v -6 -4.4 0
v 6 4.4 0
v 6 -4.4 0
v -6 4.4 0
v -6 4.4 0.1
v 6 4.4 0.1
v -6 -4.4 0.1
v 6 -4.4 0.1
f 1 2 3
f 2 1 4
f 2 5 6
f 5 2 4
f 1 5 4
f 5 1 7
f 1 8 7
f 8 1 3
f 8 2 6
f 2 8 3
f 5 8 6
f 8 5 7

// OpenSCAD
// file: ../p/4-4edge.scad
use <../lib.scad>
$fa=1; $fs=0.2;
function ldraw_lib__4_4edge(realsolid=false) = [
// 0 Circle 1.0
// 0 Name: 4-4edge.dat
// 0 Author: James Jessiman
// 0 !LDRAW_ORG Primitive UPDATE 2017-01
// 0 !LICENSE Licensed under CC BY 2.0 and CC BY 4.0 : see CAreadme.txt
// 
// 0 BFC CERTIFY CCW
  [0,"BFC","CERTIFY"],
  [0,"BFC","CCW"],
// 
// 0 !HISTORY 1998-12-15 [PTadmin] Official Update 1998-10
// 0 !HISTORY 2005-12-28 [PTadmin] Official Update 2005-01
// 0 !HISTORY 2007-06-24 [PTadmin] Header formatted for Contributor Agreement
// 0 !HISTORY 2008-07-01 [PTadmin] Official Update 2008-01
// 0 !HISTORY 2017-01-15 [Steffen] BFCed
// 0 !HISTORY 2017-12-30 [PTadmin] Official Update 2017-01
// 
// 
// 2 24 1 0 0 0.9239 0 0.3827
  [2,24,1,0,0,0.9239,0,0.3827],
// 2 24 0.9239 0 0.3827 0.7071 0 0.7071
  [2,24,0.9239,0,0.3827,0.7071,0,0.7071],
// 2 24 0.7071 0 0.7071 0.3827 0 0.9239
  [2,24,0.7071,0,0.7071,0.3827,0,0.9239],
// 2 24 0.3827 0 0.9239 0 0 1
  [2,24,0.3827,0,0.9239,0,0,1],
// 2 24 0 0 1 -0.3827 0 0.9239
  [2,24,0,0,1,-0.3827,0,0.9239],
// 2 24 -0.3827 0 0.9239 -0.7071 0 0.7071
  [2,24,-0.3827,0,0.9239,-0.7071,0,0.7071],
// 2 24 -0.7071 0 0.7071 -0.9239 0 0.3827
  [2,24,-0.7071,0,0.7071,-0.9239,0,0.3827],
// 2 24 -0.9239 0 0.3827 -1 0 -0
  [2,24,-0.9239,0,0.3827,-1,0,-0],
// 2 24 -1 0 -0 -0.9239 0 -0.3827
  [2,24,-1,0,-0,-0.9239,0,-0.3827],
// 2 24 -0.9239 0 -0.3827 -0.7071 0 -0.7071
  [2,24,-0.9239,0,-0.3827,-0.7071,0,-0.7071],
// 2 24 -0.7071 0 -0.7071 -0.3827 0 -0.9239
  [2,24,-0.7071,0,-0.7071,-0.3827,0,-0.9239],
// 2 24 -0.3827 0 -0.9239 0 0 -1
  [2,24,-0.3827,0,-0.9239,0,0,-1],
// 2 24 0 0 -1 0.3827 0 -0.9239
  [2,24,0,0,-1,0.3827,0,-0.9239],
// 2 24 0.3827 0 -0.9239 0.7071 0 -0.7071
  [2,24,0.3827,0,-0.9239,0.7071,0,-0.7071],
// 2 24 0.7071 0 -0.7071 0.9239 0 -0.3827
  [2,24,0.7071,0,-0.7071,0.9239,0,-0.3827],
// 2 24 0.9239 0 -0.3827 1 0 0
  [2,24,0.9239,0,-0.3827,1,0,0],
];
module ldraw_lib__4_4edge(step=0, col=false, unit=2/5, alt=false, line=0.2, solid=!$preview)
    makepoly(ldraw_lib__4_4edge(solid), step=step, col=col, unit=unit, alt=alt, line=line, solid=solid);
ldraw_lib__4_4edge(line=0.2);
// file: ../p/4-4disc.scad
use <../lib.scad>
$fa=1; $fs=0.2;
function ldraw_lib__4_4disc(realsolid=false) = [
// 0 Disc 1.0
// 0 Name: 4-4disc.dat
// 0 Author: James Jessiman
// 0 !LDRAW_ORG Primitive UPDATE 2002-02
// 0 !LICENSE Licensed under CC BY 2.0 and CC BY 4.0 : see CAreadme.txt
// 
// 0 BFC CERTIFY CCW
  [0,"BFC","CERTIFY"],
  [0,"BFC","CCW"],
// 
// 0 !HISTORY 1998-12-15 [PTadmin] Official Update 1998-10
// 0 !HISTORY 2002-03-23 [sbliss] Added BFC statement
// 0 !HISTORY 2002-04-25 [PTadmin] Official Update 2002-02
// 0 !HISTORY 2007-06-24 [PTadmin] Header formatted for Contributor Agreement
// 0 !HISTORY 2008-07-01 [PTadmin] Official Update 2008-01
// 
// 
// 3 16 0 0 0 1 0 0 0.9239 0 0.3827
  [3,16,0,0,0,1,0,0,0.9239,0,0.3827],
// 3 16 0 0 0 0.9239 0 0.3827 0.7071 0 0.7071
  [3,16,0,0,0,0.9239,0,0.3827,0.7071,0,0.7071],
// 3 16 0 0 0 0.7071 0 0.7071 0.3827 0 0.9239
  [3,16,0,0,0,0.7071,0,0.7071,0.3827,0,0.9239],
// 3 16 0 0 0 0.3827 0 0.9239 0 0 1
  [3,16,0,0,0,0.3827,0,0.9239,0,0,1],
// 3 16 0 0 0 0 0 1 -0.3827 0 0.9239
  [3,16,0,0,0,0,0,1,-0.3827,0,0.9239],
// 3 16 0 0 0 -0.3827 0 0.9239 -0.7071 0 0.7071
  [3,16,0,0,0,-0.3827,0,0.9239,-0.7071,0,0.7071],
// 3 16 0 0 0 -0.7071 0 0.7071 -0.9239 0 0.3827
  [3,16,0,0,0,-0.7071,0,0.7071,-0.9239,0,0.3827],
// 3 16 0 0 0 -0.9239 0 0.3827 -1 0 -0
  [3,16,0,0,0,-0.9239,0,0.3827,-1,0,-0],
// 3 16 0 0 0 -1 0 -0 -0.9239 0 -0.3827
  [3,16,0,0,0,-1,0,-0,-0.9239,0,-0.3827],
// 3 16 0 0 0 -0.9239 0 -0.3827 -0.7071 0 -0.7071
  [3,16,0,0,0,-0.9239,0,-0.3827,-0.7071,0,-0.7071],
// 3 16 0 0 0 -0.7071 0 -0.7071 -0.3827 0 -0.9239
  [3,16,0,0,0,-0.7071,0,-0.7071,-0.3827,0,-0.9239],
// 3 16 0 0 0 -0.3827 0 -0.9239 0 0 -1
  [3,16,0,0,0,-0.3827,0,-0.9239,0,0,-1],
// 3 16 0 0 0 0 0 -1 0.3827 0 -0.9239
  [3,16,0,0,0,0,0,-1,0.3827,0,-0.9239],
// 3 16 0 0 0 0.3827 0 -0.9239 0.7071 0 -0.7071
  [3,16,0,0,0,0.3827,0,-0.9239,0.7071,0,-0.7071],
// 3 16 0 0 0 0.7071 0 -0.7071 0.9239 0 -0.3827
  [3,16,0,0,0,0.7071,0,-0.7071,0.9239,0,-0.3827],
// 3 16 0 0 0 0.9239 0 -0.3827 1 0 0
  [3,16,0,0,0,0.9239,0,-0.3827,1,0,0],
// 0
];
module ldraw_lib__4_4disc(step=0, col=false, unit=2/5, alt=false, line=0.2, solid=!$preview)
    makepoly(ldraw_lib__4_4disc(solid), step=step, col=col, unit=unit, alt=alt, line=line, solid=solid);
ldraw_lib__4_4disc(line=0.2);
// file: ../p/4-4cyli.scad
use <../lib.scad>
$fa=1; $fs=0.2;
function ldraw_lib__4_4cyli(realsolid=false) = [
// 0 Cylinder 1.0
// 0 Name: 4-4cyli.dat
// 0 Author: James Jessiman
// 0 !LDRAW_ORG Primitive UPDATE 2005-01
// 0 !LICENSE Licensed under CC BY 2.0 and CC BY 4.0 : see CAreadme.txt
// 
// 0 BFC CERTIFY CCW
  [0,"BFC","CERTIFY"],
  [0,"BFC","CCW"],
// 
// 0 !HISTORY 1998-12-15 [PTadmin] Official Update 1998-10
// 0 !HISTORY 2002-03-23 [sbliss] Added BFC statement; merged headers from files in distributions LDraw 0.27 and Complete.
// 0 !HISTORY 2002-04-25 [PTadmin] Official Update 2002-02
// 0 !HISTORY 2004-12-14 [guyvivan] BFC CCW
// 0 !HISTORY 2005-12-28 [PTadmin] Official Update 2005-01
// 0 !HISTORY 2007-06-24 [PTadmin] Header formatted for Contributor Agreement
// 0 !HISTORY 2008-07-01 [PTadmin] Official Update 2008-01
// 
// 
// 4 16 1 1 0 0.9239 1 0.3827 0.9239 0 0.3827 1 0 0
  [4,16,1,1,0,0.9239,1,0.3827,0.9239,0,0.3827,1,0,0],
// 5 24 1 0 0 1 1 0 0.9239 0 0.3827 0.9239 0 -0.3827
  [5,24,1,0,0,1,1,0,0.9239,0,0.3827,0.9239,0,-0.3827],
// 4 16 0.9239 1 0.3827 0.7071 1 0.7071 0.7071 0 0.7071 0.9239 0 0.3827
  [4,16,0.9239,1,0.3827,0.7071,1,0.7071,0.7071,0,0.7071,0.9239,0,0.3827],
// 5 24 0.9239 0 0.3827 0.9239 1 0.3827 0.7071 0 0.7071 1 0 0
  [5,24,0.9239,0,0.3827,0.9239,1,0.3827,0.7071,0,0.7071,1,0,0],
// 4 16 0.7071 1 0.7071 0.3827 1 0.9239 0.3827 0 0.9239 0.7071 0 0.7071
  [4,16,0.7071,1,0.7071,0.3827,1,0.9239,0.3827,0,0.9239,0.7071,0,0.7071],
// 5 24 0.7071 0 0.7071 0.7071 1 0.7071 0.3827 0 0.9239 0.9239 0 0.3827
  [5,24,0.7071,0,0.7071,0.7071,1,0.7071,0.3827,0,0.9239,0.9239,0,0.3827],
// 4 16 0.3827 1 0.9239 0 1 1 0 0 1 0.3827 0 0.9239
  [4,16,0.3827,1,0.9239,0,1,1,0,0,1,0.3827,0,0.9239],
// 5 24 0.3827 0 0.9239 0.3827 1 0.9239 0 0 1 0.7071 0 0.7071
  [5,24,0.3827,0,0.9239,0.3827,1,0.9239,0,0,1,0.7071,0,0.7071],
// 4 16 0 1 1 -0.3827 1 0.9239 -0.3827 0 0.9239 0 0 1
  [4,16,0,1,1,-0.3827,1,0.9239,-0.3827,0,0.9239,0,0,1],
// 5 24 0 0 1 0 1 1 -0.3827 0 0.9239 0.3827 0 0.9239
  [5,24,0,0,1,0,1,1,-0.3827,0,0.9239,0.3827,0,0.9239],
// 4 16 -0.3827 1 0.9239 -0.7071 1 0.7071 -0.7071 0 0.7071 -0.3827 0 0.9239
  [4,16,-0.3827,1,0.9239,-0.7071,1,0.7071,-0.7071,0,0.7071,-0.3827,0,0.9239],
// 5 24 -0.3827 0 0.9239 -0.3827 1 0.9239 -0.7071 0 0.7071 0 0 1
  [5,24,-0.3827,0,0.9239,-0.3827,1,0.9239,-0.7071,0,0.7071,0,0,1],
// 4 16 -0.7071 1 0.7071 -0.9239 1 0.3827 -0.9239 0 0.3827 -0.7071 0 0.7071
  [4,16,-0.7071,1,0.7071,-0.9239,1,0.3827,-0.9239,0,0.3827,-0.7071,0,0.7071],
// 5 24 -0.7071 0 0.7071 -0.7071 1 0.7071 -0.9239 0 0.3827 -0.3827 0 0.9239
  [5,24,-0.7071,0,0.7071,-0.7071,1,0.7071,-0.9239,0,0.3827,-0.3827,0,0.9239],
// 4 16 -0.9239 1 0.3827 -1 1 0 -1 0 0 -0.9239 0 0.3827
  [4,16,-0.9239,1,0.3827,-1,1,0,-1,0,0,-0.9239,0,0.3827],
// 5 24 -0.9239 0 0.3827 -0.9239 1 0.3827 -1 0 0 -0.7071 0 0.7071
  [5,24,-0.9239,0,0.3827,-0.9239,1,0.3827,-1,0,0,-0.7071,0,0.7071],
// 4 16 -1 1 0 -0.9239 1 -0.3827 -0.9239 0 -0.3827 -1 0 0
  [4,16,-1,1,0,-0.9239,1,-0.3827,-0.9239,0,-0.3827,-1,0,0],
// 5 24 -1 0 0 -1 1 0 -0.9239 0 -0.3827 -0.9239 0 0.3827
  [5,24,-1,0,0,-1,1,0,-0.9239,0,-0.3827,-0.9239,0,0.3827],
// 4 16 -0.9239 1 -0.3827 -0.7071 1 -0.7071 -0.7071 0 -0.7071 -0.9239 0 -0.3827
  [4,16,-0.9239,1,-0.3827,-0.7071,1,-0.7071,-0.7071,0,-0.7071,-0.9239,0,-0.3827],
// 5 24 -0.9239 0 -0.3827 -0.9239 1 -0.3827 -0.7071 0 -0.7071 -1 0 0
  [5,24,-0.9239,0,-0.3827,-0.9239,1,-0.3827,-0.7071,0,-0.7071,-1,0,0],
// 4 16 -0.7071 1 -0.7071 -0.3827 1 -0.9239 -0.3827 0 -0.9239 -0.7071 0 -0.7071
  [4,16,-0.7071,1,-0.7071,-0.3827,1,-0.9239,-0.3827,0,-0.9239,-0.7071,0,-0.7071],
// 5 24 -0.7071 0 -0.7071 -0.7071 1 -0.7071 -0.3827 0 -0.9239 -0.9239 0 -0.3827
  [5,24,-0.7071,0,-0.7071,-0.7071,1,-0.7071,-0.3827,0,-0.9239,-0.9239,0,-0.3827],
// 4 16 -0.3827 1 -0.9239 0 1 -1 0 0 -1 -0.3827 0 -0.9239
  [4,16,-0.3827,1,-0.9239,0,1,-1,0,0,-1,-0.3827,0,-0.9239],
// 5 24 -0.3827 0 -0.9239 -0.3827 1 -0.9239 0 0 -1 -0.7071 0 -0.7071
  [5,24,-0.3827,0,-0.9239,-0.3827,1,-0.9239,0,0,-1,-0.7071,0,-0.7071],
// 4 16 0 1 -1 0.3827 1 -0.9239 0.3827 0 -0.9239 0 0 -1
  [4,16,0,1,-1,0.3827,1,-0.9239,0.3827,0,-0.9239,0,0,-1],
// 5 24 0 0 -1 0 1 -1 0.3827 0 -0.9239 -0.3827 0 -0.9239
  [5,24,0,0,-1,0,1,-1,0.3827,0,-0.9239,-0.3827,0,-0.9239],
// 4 16 0.3827 1 -0.9239 0.7071 1 -0.7071 0.7071 0 -0.7071 0.3827 0 -0.9239
  [4,16,0.3827,1,-0.9239,0.7071,1,-0.7071,0.7071,0,-0.7071,0.3827,0,-0.9239],
// 5 24 0.3827 0 -0.9239 0.3827 1 -0.9239 0.7071 0 -0.7071 0 0 -1
  [5,24,0.3827,0,-0.9239,0.3827,1,-0.9239,0.7071,0,-0.7071,0,0,-1],
// 4 16 0.7071 1 -0.7071 0.9239 1 -0.3827 0.9239 0 -0.3827 0.7071 0 -0.7071
  [4,16,0.7071,1,-0.7071,0.9239,1,-0.3827,0.9239,0,-0.3827,0.7071,0,-0.7071],
// 5 24 0.7071 0 -0.7071 0.7071 1 -0.7071 0.9239 0 -0.3827 0.3827 0 -0.9239
  [5,24,0.7071,0,-0.7071,0.7071,1,-0.7071,0.9239,0,-0.3827,0.3827,0,-0.9239],
// 4 16 0.9239 1 -0.3827 1 1 0 1 0 0 0.9239 0 -0.3827
  [4,16,0.9239,1,-0.3827,1,1,0,1,0,0,0.9239,0,-0.3827],
// 5 24 0.9239 0 -0.3827 0.9239 1 -0.3827 1 0 0 0.7071 0 -0.7071
  [5,24,0.9239,0,-0.3827,0.9239,1,-0.3827,1,0,0,0.7071,0,-0.7071],
// 0
];
module ldraw_lib__4_4cyli(step=0, col=false, unit=2/5, alt=false, line=0.2, solid=!$preview)
    makepoly(ldraw_lib__4_4cyli(solid), step=step, col=col, unit=unit, alt=alt, line=line, solid=solid);
ldraw_lib__4_4cyli(line=0.2);
// file: ../p/stud3.scad
use <../lib.scad>
use <4-4cyli.scad>
use <4-4disc.scad>
use <4-4edge.scad>
$fa=1; $fs=0.2;
function ldraw_lib__stud3(realsolid=false) = realsolid ? 
    [openscad(translate([0,0,-eps()], o=cylinder(4+eps(), r=4)),2)] : [
// 0 Stud Tube Solid
// 0 Name: stud3.dat
// 0 Author: James Jessiman
// 0 !LDRAW_ORG Primitive UPDATE 2012-01
// 0 !LICENSE Licensed under CC BY 2.0 and CC BY 4.0 : see CAreadme.txt
// 
// 0 BFC CERTIFY CCW
  [0,"BFC","CERTIFY"],
  [0,"BFC","CCW"],
// 
// 0 !HISTORY 2002-04-04 [sbliss] Modified for BFC compliance
// 0 !HISTORY 2002-04-25 [PTadmin] Official Update 2002-02
// 0 !HISTORY 2007-06-24 [PTadmin] Header formatted for Contributor Agreement
// 0 !HISTORY 2008-07-01 [PTadmin] Official Update 2008-01
// 0 !HISTORY 2012-02-16 [Philo] Changed to CCW
// 0 !HISTORY 2012-03-30 [PTadmin] Official Update 2012-01
// 
// 
// 1 16 0 -4 0 4 0 0 0 1 0 0 0 4 4-4edge.dat
  [1,16,0,-4,0,4,0,0,0,1,0,0,0,4, ldraw_lib__4_4edge(realsolid)],
// 1 16 0 0 0 4 0 0 0 1 0 0 0 4 4-4edge.dat
  [1,16,0,0,0,4,0,0,0,1,0,0,0,4, ldraw_lib__4_4edge(realsolid)],
// 1 16 0 -4 0 4 0 0 0 1 0 0 0 4 4-4disc.dat
  [1,16,0,-4,0,4,0,0,0,1,0,0,0,4, ldraw_lib__4_4disc(realsolid)],
// 1 16 0 -4 0 4 0 0 0 4 0 0 0 4 4-4cyli.dat
  [1,16,0,-4,0,4,0,0,0,4,0,0,0,4, ldraw_lib__4_4cyli(realsolid)],
];
module ldraw_lib__stud3(step=0, col=false, unit=2/5, alt=false, line=0.2, solid=!$preview)
    makepoly(ldraw_lib__stud3(solid), step=step, col=col, unit=unit, alt=alt, line=line, solid=solid);
ldraw_lib__stud3(line=0.2);
// file: ../p/stud.scad
use <../lib.scad>
use <4-4cyli.scad>
use <4-4disc.scad>
use <4-4edge.scad>
$fa=1; $fs=0.2;
function ldraw_lib__stud(realsolid=false) = realsolid ? 
    [openscad(translate([0,0,-eps()], o=cylinder(4+eps(), r=6)),2)] : [
// 0 Stud
// 0 Name: stud.dat
// 0 Author: James Jessiman
// 0 !LDRAW_ORG Primitive UPDATE 2012-01
// 0 !LICENSE Licensed under CC BY 2.0 and CC BY 4.0 : see CAreadme.txt
// 
// 0 BFC CERTIFY CCW
  [0,"BFC","CERTIFY"],
  [0,"BFC","CCW"],
// 
// 0 !HISTORY 2002-04-04 [sbliss] Modified for BFC compliance
// 0 !HISTORY 2002-04-25 [PTadmin] Official Update 2002-02
// 0 !HISTORY 2007-06-24 [PTadmin] Header formatted for Contributor Agreement
// 0 !HISTORY 2008-07-01 [PTadmin] Official Update 2008-01
// 0 !HISTORY 2012-02-16 [Philo] Changed to CCW
// 0 !HISTORY 2012-03-30 [PTadmin] Official Update 2012-01
// 
// 
// 1 16 0 0 0 6 0 0 0 1 0 0 0 6 4-4edge.dat
  [1,16,0,0,0,6,0,0,0,1,0,0,0,6, ldraw_lib__4_4edge(realsolid)],
// 1 16 0 -4 0 6 0 0 0 1 0 0 0 6 4-4edge.dat
  [1,16,0,-4,0,6,0,0,0,1,0,0,0,6, ldraw_lib__4_4edge(realsolid)],
// 1 16 0 0 0 6 0 0 0 -4 0 0 0 6 4-4cyli.dat
  [1,16,0,0,0,6,0,0,0,-4,0,0,0,6, ldraw_lib__4_4cyli(realsolid)],
// 1 16 0 -4 0 6 0 0 0 1 0 0 0 6 4-4disc.dat
  [1,16,0,-4,0,6,0,0,0,1,0,0,0,6, ldraw_lib__4_4disc(realsolid)],
];
module ldraw_lib__stud(step=0, col=false, unit=2/5, alt=false, line=0.2, solid=!$preview)
    makepoly(ldraw_lib__stud(solid), step=step, col=col, unit=unit, alt=alt, line=line, solid=solid);
ldraw_lib__stud(line=0.2);
// file: ../p/box5.scad
use <../lib.scad>
$fa=1; $fs=0.2;
function ldraw_lib__box5(realsolid=false) = [
// 0 Box with 5 Faces and All Edges
// 0 Name: box5.dat
// 0 Author: James Jessiman
// 0 !LDRAW_ORG Primitive UPDATE 2012-01
// 0 !LICENSE Licensed under CC BY 2.0 and CC BY 4.0 : see CAreadme.txt
// 
// 0 BFC CERTIFY CCW
  [0,"BFC","CERTIFY"],
  [0,"BFC","CCW"],
// 
// 0 !HISTORY 2002-04-03 [sbliss] Modified for BFC compliance
// 0 !HISTORY 2002-04-25 [PTadmin] Official Update 2002-02
// 0 !HISTORY 2007-06-24 [PTadmin] Header formatted for Contributor Agreement
// 0 !HISTORY 2008-07-01 [PTadmin] Official Update 2008-01
// 0 !HISTORY 2012-02-16 [Philo] Changed to CCW
// 0 !HISTORY 2012-03-30 [PTadmin] Official Update 2012-01
// 
// 
// 2 24 1 1 1 -1 1 1
  [2,24,1,1,1,-1,1,1],
// 2 24 -1 1 1 -1 1 -1
  [2,24,-1,1,1,-1,1,-1],
// 2 24 -1 1 -1 1 1 -1
  [2,24,-1,1,-1,1,1,-1],
// 2 24 1 1 -1 1 1 1
  [2,24,1,1,-1,1,1,1],
// 2 24 1 0 1 -1 0 1
  [2,24,1,0,1,-1,0,1],
// 2 24 -1 0 1 -1 0 -1
  [2,24,-1,0,1,-1,0,-1],
// 2 24 -1 0 -1 1 0 -1
  [2,24,-1,0,-1,1,0,-1],
// 2 24 1 0 -1 1 0 1
  [2,24,1,0,-1,1,0,1],
// 2 24 1 0 1 1 1 1
  [2,24,1,0,1,1,1,1],
// 2 24 -1 0 1 -1 1 1
  [2,24,-1,0,1,-1,1,1],
// 2 24 1 0 -1 1 1 -1
  [2,24,1,0,-1,1,1,-1],
// 2 24 -1 0 -1 -1 1 -1
  [2,24,-1,0,-1,-1,1,-1],
// 4 16 -1 1 1 1 1 1 1 1 -1 -1 1 -1
  [4,16,-1,1,1,1,1,1,1,1,-1,-1,1,-1],
// 4 16 -1 1 1 -1 0 1 1 0 1 1 1 1
  [4,16,-1,1,1,-1,0,1,1,0,1,1,1,1],
// 4 16 -1 1 -1 -1 0 -1 -1 0 1 -1 1 1
  [4,16,-1,1,-1,-1,0,-1,-1,0,1,-1,1,1],
// 4 16 1 1 -1 1 0 -1 -1 0 -1 -1 1 -1
  [4,16,1,1,-1,1,0,-1,-1,0,-1,-1,1,-1],
// 4 16 1 1 1 1 0 1 1 0 -1 1 1 -1
  [4,16,1,1,1,1,0,1,1,0,-1,1,1,-1],
];
module ldraw_lib__box5(step=0, col=false, unit=2/5, alt=false, line=0.2, solid=!$preview)
    makepoly(ldraw_lib__box5(solid), step=step, col=col, unit=unit, alt=alt, line=line, solid=solid);
ldraw_lib__box5(line=0.2);
// file: ../p/box4t.scad
use <../lib.scad>
$fa=1; $fs=0.2;
function ldraw_lib__box4t(realsolid=false) = [
// 0 Box with 4 Adjacent Faces and All Edges
// 0 Name: box4t.dat
// 0 Author: Tore Eriksson [Tore_Eriksson]
// 0 !LDRAW_ORG Primitive UPDATE 2003-02
// 0 !LICENSE Licensed under CC BY 2.0 and CC BY 4.0 : see CAreadme.txt
// 
// 0 BFC CERTIFY CCW
  [0,"BFC","CERTIFY"],
  [0,"BFC","CCW"],
// 
// 0 !HISTORY 1997-09-29 [PTadmin] Official Update 1997-15
// 0 !HISTORY 2002-08-31 [izanette] Modified with WINDZ for BFC compliance
// 0 !HISTORY 2003-08-01 [PTadmin] Official Update 2003-02
// 0 !HISTORY 2007-06-24 [PTadmin] Header formatted for Contributor Agreement
// 0 !HISTORY 2008-07-01 [PTadmin] Official Update 2008-01
// 
// 
// 2 24 1 1 1 -1 1 1
  [2,24,1,1,1,-1,1,1],
// 2 24 -1 1 1 -1 1 -1
  [2,24,-1,1,1,-1,1,-1],
// 2 24 -1 1 -1 1 1 -1
  [2,24,-1,1,-1,1,1,-1],
// 2 24 1 1 -1 1 1 1
  [2,24,1,1,-1,1,1,1],
// 2 24 1 0 1 -1 0 1
  [2,24,1,0,1,-1,0,1],
// 2 24 -1 0 1 -1 0 -1
  [2,24,-1,0,1,-1,0,-1],
// 2 24 -1 0 -1 1 0 -1
  [2,24,-1,0,-1,1,0,-1],
// 2 24 1 0 -1 1 0 1
  [2,24,1,0,-1,1,0,1],
// 2 24 1 0 1 1 1 1
  [2,24,1,0,1,1,1,1],
// 2 24 -1 0 1 -1 1 1
  [2,24,-1,0,1,-1,1,1],
// 2 24 1 0 -1 1 1 -1
  [2,24,1,0,-1,1,1,-1],
// 2 24 -1 0 -1 -1 1 -1
  [2,24,-1,0,-1,-1,1,-1],
// 4 16 1 1 1 1 1 -1 -1 1 -1 -1 1 1
  [4,16,1,1,1,1,1,-1,-1,1,-1,-1,1,1],
// 4 16 1 1 1 -1 1 1 -1 0 1 1 0 1
  [4,16,1,1,1,-1,1,1,-1,0,1,1,0,1],
// 4 16 -1 1 1 -1 1 -1 -1 0 -1 -1 0 1
  [4,16,-1,1,1,-1,1,-1,-1,0,-1,-1,0,1],
// 0 4 16 -1 1 -1 -1 0 -1 1 0 -1 1 1 -1
// 4 16 1 1 -1 1 1 1 1 0 1 1 0 -1
  [4,16,1,1,-1,1,1,1,1,0,1,1,0,-1],
// 0
];
module ldraw_lib__box4t(step=0, col=false, unit=2/5, alt=false, line=0.2, solid=!$preview)
    makepoly(ldraw_lib__box4t(solid), step=step, col=col, unit=unit, alt=alt, line=line, solid=solid);
ldraw_lib__box4t(line=0.2);
// file: s/3004s01.scad
use <../../lib.scad>
use <../../p/box4t.scad>
use <../../p/box5.scad>
use <../../p/stud.scad>
use <../../p/stud3.scad>
$fa=1; $fs=0.2;
function ldraw_lib__s__3004s01(realsolid=false) = [
// 0 ~Brick  1 x  2 without Front Face
// 0 Name: s\3004s01.dat
// 0 Author: James Jessiman
// 0 !LDRAW_ORG Subpart UPDATE 2003-03
// 0 !LICENSE Licensed under CC BY 2.0 and CC BY 4.0 : see CAreadme.txt
// 
// 0 BFC CERTIFY CCW
  [0,"BFC","CERTIFY"],
  [0,"BFC","CCW"],
// 
// 0 !HISTORY 2003-09-07 [jriley] Subfiling, BFC
// 0 !HISTORY 2003-12-19 [PTadmin] Official Update 2003-03
// 0 !HISTORY 2007-08-29 [PTadmin] Header formatted for Contributor Agreement
// 0 !HISTORY 2008-07-01 [PTadmin] Official Update 2008-01
// 
// 
// 1 16 0 4 0 1 0 0 0 -5 0 0 0 1 stud3.dat
  [1,16,0,4,0,1,0,0,0,-5,0,0,0,1, ldraw_lib__stud3(realsolid)],
// 0 BFC INVERTNEXT
  [0,"BFC","INVERTNEXT"],
// 1 16 0 24 0 16 0 0 0 -20 0 0 0 6 box5.dat
  [1,16,0,24,0,16,0,0,0,-20,0,0,0,6, ldraw_lib__box5(realsolid)],
// 4 16 20 24 10 16 24 6 -16 24 6 -20 24 10
  [4,16,20,24,10,16,24,6,-16,24,6,-20,24,10],
// 4 16 -20 24 10 -16 24 6 -16 24 -6 -20 24 -10
  [4,16,-20,24,10,-16,24,6,-16,24,-6,-20,24,-10],
// 4 16 -20 24 -10 -16 24 -6 16 24 -6 20 24 -10
  [4,16,-20,24,-10,-16,24,-6,16,24,-6,20,24,-10],
// 4 16 20 24 -10 16 24 -6 16 24 6 20 24 10
  [4,16,20,24,-10,16,24,-6,16,24,6,20,24,10],
// 1 16 0 24 0 20 0 0 0 -24 0 0 0 10 box4t.dat
  [1,16,0,24,0,20,0,0,0,-24,0,0,0,10, ldraw_lib__box4t(realsolid)],
// 1 16 10 0 0 1 0 0 0 1 0 0 0 1 stud.dat
  [1,16,10,0,0,1,0,0,0,1,0,0,0,1, ldraw_lib__stud(realsolid)],
// 1 16 -10 0 0 1 0 0 0 1 0 0 0 1 stud.dat
  [1,16,-10,0,0,1,0,0,0,1,0,0,0,1, ldraw_lib__stud(realsolid)],
// 0
];
module ldraw_lib__s__3004s01(step=0, col=false, unit=2/5, alt=false, line=0.2, solid=!$preview)
    makepoly(ldraw_lib__s__3004s01(solid), step=step, col=col, unit=unit, alt=alt, line=line, solid=solid);
ldraw_lib__s__3004s01(line=0.2);
// file: 3004.scad
use <../lib.scad>
use <s/3004s01.scad>
$fa=1; $fs=0.2;
function ldraw_lib__3004(realsolid=false) = [
// 0 Brick  1 x  2
// 0 Name: 3004.dat
// 0 Author: James Jessiman
// 0 !LDRAW_ORG Part UPDATE 2022-05
// 0 !LICENSE Licensed under CC BY 2.0 and CC BY 4.0 : see CAreadme.txt
// 
// 0 BFC CERTIFY CCW
  [0,"BFC","CERTIFY"],
  [0,"BFC","CCW"],
// 
// 0 !HISTORY 2001-10-26 [PTadmin] Official Update 2001-01
// 0 !HISTORY 2002-05-07 {unknown} BFC Certification
// 0 !HISTORY 2002-06-11 [PTadmin] Official Update 2002-03
// 0 !HISTORY 2007-05-07 [PTadmin] Header formatted for Contributor Agreement
// 0 !HISTORY 2008-07-01 [PTadmin] Official Update 2008-01
// 0 !HISTORY 2022-08-04 [MagFors] Using subfile
// 0 !HISTORY 2022-09-15 [PTadmin] Official Update 2022-05
// 
// 
// 1 16 0 0 0 1 0 0 0 1 0 0 0 1 s\3004s01.dat
  [1,16,0,0,0,1,0,0,0,1,0,0,0,1, ldraw_lib__s__3004s01(realsolid)],
// 4 16 -20 24 -10 20 24 -10 20 0 -10 -20 0 -10
  [4,16,-20,24,-10,20,24,-10,20,0,-10,-20,0,-10],
];
module ldraw_lib__3004(step=0, col=false, unit=2/5, alt=false, line=0.2, solid=!$preview)
    makepoly(ldraw_lib__3004(solid), step=step, col=col, unit=unit, alt=alt, line=line, solid=solid);
ldraw_lib__3004(line=0.2);
// file: ../p/box5-12.scad
use <../lib.scad>
$fa=1; $fs=0.2;
function ldraw_lib__box5_12(realsolid=false) = [
// 0 Box with 5 Faces without Any Edges
// 0 Name: box5-12.dat
// 0 Author: Chris Dee [cwdee]
// 0 !LDRAW_ORG Primitive UPDATE 2009-02
// 0 !LICENSE Licensed under CC BY 2.0 and CC BY 4.0 : see CAreadme.txt
// 
// 0 BFC CERTIFY CCW
  [0,"BFC","CERTIFY"],
  [0,"BFC","CCW"],
// 
// 0 !HISTORY 2009-09-03 [PTadmin] Official Update 2009-02
// 
// 
// 4 16 1 1 1 1 1 -1 -1 1 -1 -1 1 1
  [4,16,1,1,1,1,1,-1,-1,1,-1,-1,1,1],
// 4 16 -1 0 1 1 0 1 1 1 1 -1 1 1
  [4,16,-1,0,1,1,0,1,1,1,1,-1,1,1],
// 4 16 -1 0 -1 -1 0 1 -1 1 1 -1 1 -1
  [4,16,-1,0,-1,-1,0,1,-1,1,1,-1,1,-1],
// 4 16 1 0 -1 -1 0 -1 -1 1 -1 1 1 -1
  [4,16,1,0,-1,-1,0,-1,-1,1,-1,1,1,-1],
// 4 16 1 0 1 1 0 -1 1 1 -1 1 1 1
  [4,16,1,0,1,1,0,-1,1,1,-1,1,1,1],
// 0
];
module ldraw_lib__box5_12(step=0, col=false, unit=2/5, alt=false, line=0.2, solid=!$preview)
    makepoly(ldraw_lib__box5_12(solid), step=step, col=col, unit=unit, alt=alt, line=line, solid=solid);
ldraw_lib__box5_12(line=0.2);
// main file
use <../lib.scad>
use <../p/box5-12.scad>
$fa=1; $fs=0.2;
function ldraw_lib__192375d(realsolid=false) = [
// 0 Sticker  1.1 x  1.5 with Red Rectangle
// 0 Name: 192375d.dat
// 0 Author: Takeshi Takahashi [RainbowDolphin]
// 0 !LDRAW_ORG Part UPDATE 2022-05
// 0 !LICENSE Licensed under CC BY 2.0 and CC BY 4.0 : see CAreadme.txt
// 
// 0 BFC CERTIFY CCW
  [0,"BFC","CERTIFY"],
  [0,"BFC","CCW"],
// 
// 0 !KEYWORDS Exxon, Gas Station, Set 6375-2
// 
// 0 !HISTORY 2022-09-15 [PTadmin] Official Update 2022-05
// 
// 
// 1 16 0 -0.25 0 15 0 0 0 0.25 0 0 0 11 box5-12.dat
  [1,16,0,-0.25,0,15,0,0,0,0.25,0,0,0,11, ldraw_lib__box5_12(realsolid)],
// 
// 4 4 15 -0.25 11 -15 -0.25 11 -15 -0.25 -11 15 -0.25 -11
  [4,4,15,-0.25,11,-15,-0.25,11,-15,-0.25,-11,15,-0.25,-11],
];
module ldraw_lib__192375d(step=0, col=false, unit=2/5, alt=false, line=0.2, solid=!$preview)
    makepoly(ldraw_lib__192375d(solid), step=step, col=col, unit=unit, alt=alt, line=line, solid=solid);
ldraw_lib__192375d(line=0.2);
